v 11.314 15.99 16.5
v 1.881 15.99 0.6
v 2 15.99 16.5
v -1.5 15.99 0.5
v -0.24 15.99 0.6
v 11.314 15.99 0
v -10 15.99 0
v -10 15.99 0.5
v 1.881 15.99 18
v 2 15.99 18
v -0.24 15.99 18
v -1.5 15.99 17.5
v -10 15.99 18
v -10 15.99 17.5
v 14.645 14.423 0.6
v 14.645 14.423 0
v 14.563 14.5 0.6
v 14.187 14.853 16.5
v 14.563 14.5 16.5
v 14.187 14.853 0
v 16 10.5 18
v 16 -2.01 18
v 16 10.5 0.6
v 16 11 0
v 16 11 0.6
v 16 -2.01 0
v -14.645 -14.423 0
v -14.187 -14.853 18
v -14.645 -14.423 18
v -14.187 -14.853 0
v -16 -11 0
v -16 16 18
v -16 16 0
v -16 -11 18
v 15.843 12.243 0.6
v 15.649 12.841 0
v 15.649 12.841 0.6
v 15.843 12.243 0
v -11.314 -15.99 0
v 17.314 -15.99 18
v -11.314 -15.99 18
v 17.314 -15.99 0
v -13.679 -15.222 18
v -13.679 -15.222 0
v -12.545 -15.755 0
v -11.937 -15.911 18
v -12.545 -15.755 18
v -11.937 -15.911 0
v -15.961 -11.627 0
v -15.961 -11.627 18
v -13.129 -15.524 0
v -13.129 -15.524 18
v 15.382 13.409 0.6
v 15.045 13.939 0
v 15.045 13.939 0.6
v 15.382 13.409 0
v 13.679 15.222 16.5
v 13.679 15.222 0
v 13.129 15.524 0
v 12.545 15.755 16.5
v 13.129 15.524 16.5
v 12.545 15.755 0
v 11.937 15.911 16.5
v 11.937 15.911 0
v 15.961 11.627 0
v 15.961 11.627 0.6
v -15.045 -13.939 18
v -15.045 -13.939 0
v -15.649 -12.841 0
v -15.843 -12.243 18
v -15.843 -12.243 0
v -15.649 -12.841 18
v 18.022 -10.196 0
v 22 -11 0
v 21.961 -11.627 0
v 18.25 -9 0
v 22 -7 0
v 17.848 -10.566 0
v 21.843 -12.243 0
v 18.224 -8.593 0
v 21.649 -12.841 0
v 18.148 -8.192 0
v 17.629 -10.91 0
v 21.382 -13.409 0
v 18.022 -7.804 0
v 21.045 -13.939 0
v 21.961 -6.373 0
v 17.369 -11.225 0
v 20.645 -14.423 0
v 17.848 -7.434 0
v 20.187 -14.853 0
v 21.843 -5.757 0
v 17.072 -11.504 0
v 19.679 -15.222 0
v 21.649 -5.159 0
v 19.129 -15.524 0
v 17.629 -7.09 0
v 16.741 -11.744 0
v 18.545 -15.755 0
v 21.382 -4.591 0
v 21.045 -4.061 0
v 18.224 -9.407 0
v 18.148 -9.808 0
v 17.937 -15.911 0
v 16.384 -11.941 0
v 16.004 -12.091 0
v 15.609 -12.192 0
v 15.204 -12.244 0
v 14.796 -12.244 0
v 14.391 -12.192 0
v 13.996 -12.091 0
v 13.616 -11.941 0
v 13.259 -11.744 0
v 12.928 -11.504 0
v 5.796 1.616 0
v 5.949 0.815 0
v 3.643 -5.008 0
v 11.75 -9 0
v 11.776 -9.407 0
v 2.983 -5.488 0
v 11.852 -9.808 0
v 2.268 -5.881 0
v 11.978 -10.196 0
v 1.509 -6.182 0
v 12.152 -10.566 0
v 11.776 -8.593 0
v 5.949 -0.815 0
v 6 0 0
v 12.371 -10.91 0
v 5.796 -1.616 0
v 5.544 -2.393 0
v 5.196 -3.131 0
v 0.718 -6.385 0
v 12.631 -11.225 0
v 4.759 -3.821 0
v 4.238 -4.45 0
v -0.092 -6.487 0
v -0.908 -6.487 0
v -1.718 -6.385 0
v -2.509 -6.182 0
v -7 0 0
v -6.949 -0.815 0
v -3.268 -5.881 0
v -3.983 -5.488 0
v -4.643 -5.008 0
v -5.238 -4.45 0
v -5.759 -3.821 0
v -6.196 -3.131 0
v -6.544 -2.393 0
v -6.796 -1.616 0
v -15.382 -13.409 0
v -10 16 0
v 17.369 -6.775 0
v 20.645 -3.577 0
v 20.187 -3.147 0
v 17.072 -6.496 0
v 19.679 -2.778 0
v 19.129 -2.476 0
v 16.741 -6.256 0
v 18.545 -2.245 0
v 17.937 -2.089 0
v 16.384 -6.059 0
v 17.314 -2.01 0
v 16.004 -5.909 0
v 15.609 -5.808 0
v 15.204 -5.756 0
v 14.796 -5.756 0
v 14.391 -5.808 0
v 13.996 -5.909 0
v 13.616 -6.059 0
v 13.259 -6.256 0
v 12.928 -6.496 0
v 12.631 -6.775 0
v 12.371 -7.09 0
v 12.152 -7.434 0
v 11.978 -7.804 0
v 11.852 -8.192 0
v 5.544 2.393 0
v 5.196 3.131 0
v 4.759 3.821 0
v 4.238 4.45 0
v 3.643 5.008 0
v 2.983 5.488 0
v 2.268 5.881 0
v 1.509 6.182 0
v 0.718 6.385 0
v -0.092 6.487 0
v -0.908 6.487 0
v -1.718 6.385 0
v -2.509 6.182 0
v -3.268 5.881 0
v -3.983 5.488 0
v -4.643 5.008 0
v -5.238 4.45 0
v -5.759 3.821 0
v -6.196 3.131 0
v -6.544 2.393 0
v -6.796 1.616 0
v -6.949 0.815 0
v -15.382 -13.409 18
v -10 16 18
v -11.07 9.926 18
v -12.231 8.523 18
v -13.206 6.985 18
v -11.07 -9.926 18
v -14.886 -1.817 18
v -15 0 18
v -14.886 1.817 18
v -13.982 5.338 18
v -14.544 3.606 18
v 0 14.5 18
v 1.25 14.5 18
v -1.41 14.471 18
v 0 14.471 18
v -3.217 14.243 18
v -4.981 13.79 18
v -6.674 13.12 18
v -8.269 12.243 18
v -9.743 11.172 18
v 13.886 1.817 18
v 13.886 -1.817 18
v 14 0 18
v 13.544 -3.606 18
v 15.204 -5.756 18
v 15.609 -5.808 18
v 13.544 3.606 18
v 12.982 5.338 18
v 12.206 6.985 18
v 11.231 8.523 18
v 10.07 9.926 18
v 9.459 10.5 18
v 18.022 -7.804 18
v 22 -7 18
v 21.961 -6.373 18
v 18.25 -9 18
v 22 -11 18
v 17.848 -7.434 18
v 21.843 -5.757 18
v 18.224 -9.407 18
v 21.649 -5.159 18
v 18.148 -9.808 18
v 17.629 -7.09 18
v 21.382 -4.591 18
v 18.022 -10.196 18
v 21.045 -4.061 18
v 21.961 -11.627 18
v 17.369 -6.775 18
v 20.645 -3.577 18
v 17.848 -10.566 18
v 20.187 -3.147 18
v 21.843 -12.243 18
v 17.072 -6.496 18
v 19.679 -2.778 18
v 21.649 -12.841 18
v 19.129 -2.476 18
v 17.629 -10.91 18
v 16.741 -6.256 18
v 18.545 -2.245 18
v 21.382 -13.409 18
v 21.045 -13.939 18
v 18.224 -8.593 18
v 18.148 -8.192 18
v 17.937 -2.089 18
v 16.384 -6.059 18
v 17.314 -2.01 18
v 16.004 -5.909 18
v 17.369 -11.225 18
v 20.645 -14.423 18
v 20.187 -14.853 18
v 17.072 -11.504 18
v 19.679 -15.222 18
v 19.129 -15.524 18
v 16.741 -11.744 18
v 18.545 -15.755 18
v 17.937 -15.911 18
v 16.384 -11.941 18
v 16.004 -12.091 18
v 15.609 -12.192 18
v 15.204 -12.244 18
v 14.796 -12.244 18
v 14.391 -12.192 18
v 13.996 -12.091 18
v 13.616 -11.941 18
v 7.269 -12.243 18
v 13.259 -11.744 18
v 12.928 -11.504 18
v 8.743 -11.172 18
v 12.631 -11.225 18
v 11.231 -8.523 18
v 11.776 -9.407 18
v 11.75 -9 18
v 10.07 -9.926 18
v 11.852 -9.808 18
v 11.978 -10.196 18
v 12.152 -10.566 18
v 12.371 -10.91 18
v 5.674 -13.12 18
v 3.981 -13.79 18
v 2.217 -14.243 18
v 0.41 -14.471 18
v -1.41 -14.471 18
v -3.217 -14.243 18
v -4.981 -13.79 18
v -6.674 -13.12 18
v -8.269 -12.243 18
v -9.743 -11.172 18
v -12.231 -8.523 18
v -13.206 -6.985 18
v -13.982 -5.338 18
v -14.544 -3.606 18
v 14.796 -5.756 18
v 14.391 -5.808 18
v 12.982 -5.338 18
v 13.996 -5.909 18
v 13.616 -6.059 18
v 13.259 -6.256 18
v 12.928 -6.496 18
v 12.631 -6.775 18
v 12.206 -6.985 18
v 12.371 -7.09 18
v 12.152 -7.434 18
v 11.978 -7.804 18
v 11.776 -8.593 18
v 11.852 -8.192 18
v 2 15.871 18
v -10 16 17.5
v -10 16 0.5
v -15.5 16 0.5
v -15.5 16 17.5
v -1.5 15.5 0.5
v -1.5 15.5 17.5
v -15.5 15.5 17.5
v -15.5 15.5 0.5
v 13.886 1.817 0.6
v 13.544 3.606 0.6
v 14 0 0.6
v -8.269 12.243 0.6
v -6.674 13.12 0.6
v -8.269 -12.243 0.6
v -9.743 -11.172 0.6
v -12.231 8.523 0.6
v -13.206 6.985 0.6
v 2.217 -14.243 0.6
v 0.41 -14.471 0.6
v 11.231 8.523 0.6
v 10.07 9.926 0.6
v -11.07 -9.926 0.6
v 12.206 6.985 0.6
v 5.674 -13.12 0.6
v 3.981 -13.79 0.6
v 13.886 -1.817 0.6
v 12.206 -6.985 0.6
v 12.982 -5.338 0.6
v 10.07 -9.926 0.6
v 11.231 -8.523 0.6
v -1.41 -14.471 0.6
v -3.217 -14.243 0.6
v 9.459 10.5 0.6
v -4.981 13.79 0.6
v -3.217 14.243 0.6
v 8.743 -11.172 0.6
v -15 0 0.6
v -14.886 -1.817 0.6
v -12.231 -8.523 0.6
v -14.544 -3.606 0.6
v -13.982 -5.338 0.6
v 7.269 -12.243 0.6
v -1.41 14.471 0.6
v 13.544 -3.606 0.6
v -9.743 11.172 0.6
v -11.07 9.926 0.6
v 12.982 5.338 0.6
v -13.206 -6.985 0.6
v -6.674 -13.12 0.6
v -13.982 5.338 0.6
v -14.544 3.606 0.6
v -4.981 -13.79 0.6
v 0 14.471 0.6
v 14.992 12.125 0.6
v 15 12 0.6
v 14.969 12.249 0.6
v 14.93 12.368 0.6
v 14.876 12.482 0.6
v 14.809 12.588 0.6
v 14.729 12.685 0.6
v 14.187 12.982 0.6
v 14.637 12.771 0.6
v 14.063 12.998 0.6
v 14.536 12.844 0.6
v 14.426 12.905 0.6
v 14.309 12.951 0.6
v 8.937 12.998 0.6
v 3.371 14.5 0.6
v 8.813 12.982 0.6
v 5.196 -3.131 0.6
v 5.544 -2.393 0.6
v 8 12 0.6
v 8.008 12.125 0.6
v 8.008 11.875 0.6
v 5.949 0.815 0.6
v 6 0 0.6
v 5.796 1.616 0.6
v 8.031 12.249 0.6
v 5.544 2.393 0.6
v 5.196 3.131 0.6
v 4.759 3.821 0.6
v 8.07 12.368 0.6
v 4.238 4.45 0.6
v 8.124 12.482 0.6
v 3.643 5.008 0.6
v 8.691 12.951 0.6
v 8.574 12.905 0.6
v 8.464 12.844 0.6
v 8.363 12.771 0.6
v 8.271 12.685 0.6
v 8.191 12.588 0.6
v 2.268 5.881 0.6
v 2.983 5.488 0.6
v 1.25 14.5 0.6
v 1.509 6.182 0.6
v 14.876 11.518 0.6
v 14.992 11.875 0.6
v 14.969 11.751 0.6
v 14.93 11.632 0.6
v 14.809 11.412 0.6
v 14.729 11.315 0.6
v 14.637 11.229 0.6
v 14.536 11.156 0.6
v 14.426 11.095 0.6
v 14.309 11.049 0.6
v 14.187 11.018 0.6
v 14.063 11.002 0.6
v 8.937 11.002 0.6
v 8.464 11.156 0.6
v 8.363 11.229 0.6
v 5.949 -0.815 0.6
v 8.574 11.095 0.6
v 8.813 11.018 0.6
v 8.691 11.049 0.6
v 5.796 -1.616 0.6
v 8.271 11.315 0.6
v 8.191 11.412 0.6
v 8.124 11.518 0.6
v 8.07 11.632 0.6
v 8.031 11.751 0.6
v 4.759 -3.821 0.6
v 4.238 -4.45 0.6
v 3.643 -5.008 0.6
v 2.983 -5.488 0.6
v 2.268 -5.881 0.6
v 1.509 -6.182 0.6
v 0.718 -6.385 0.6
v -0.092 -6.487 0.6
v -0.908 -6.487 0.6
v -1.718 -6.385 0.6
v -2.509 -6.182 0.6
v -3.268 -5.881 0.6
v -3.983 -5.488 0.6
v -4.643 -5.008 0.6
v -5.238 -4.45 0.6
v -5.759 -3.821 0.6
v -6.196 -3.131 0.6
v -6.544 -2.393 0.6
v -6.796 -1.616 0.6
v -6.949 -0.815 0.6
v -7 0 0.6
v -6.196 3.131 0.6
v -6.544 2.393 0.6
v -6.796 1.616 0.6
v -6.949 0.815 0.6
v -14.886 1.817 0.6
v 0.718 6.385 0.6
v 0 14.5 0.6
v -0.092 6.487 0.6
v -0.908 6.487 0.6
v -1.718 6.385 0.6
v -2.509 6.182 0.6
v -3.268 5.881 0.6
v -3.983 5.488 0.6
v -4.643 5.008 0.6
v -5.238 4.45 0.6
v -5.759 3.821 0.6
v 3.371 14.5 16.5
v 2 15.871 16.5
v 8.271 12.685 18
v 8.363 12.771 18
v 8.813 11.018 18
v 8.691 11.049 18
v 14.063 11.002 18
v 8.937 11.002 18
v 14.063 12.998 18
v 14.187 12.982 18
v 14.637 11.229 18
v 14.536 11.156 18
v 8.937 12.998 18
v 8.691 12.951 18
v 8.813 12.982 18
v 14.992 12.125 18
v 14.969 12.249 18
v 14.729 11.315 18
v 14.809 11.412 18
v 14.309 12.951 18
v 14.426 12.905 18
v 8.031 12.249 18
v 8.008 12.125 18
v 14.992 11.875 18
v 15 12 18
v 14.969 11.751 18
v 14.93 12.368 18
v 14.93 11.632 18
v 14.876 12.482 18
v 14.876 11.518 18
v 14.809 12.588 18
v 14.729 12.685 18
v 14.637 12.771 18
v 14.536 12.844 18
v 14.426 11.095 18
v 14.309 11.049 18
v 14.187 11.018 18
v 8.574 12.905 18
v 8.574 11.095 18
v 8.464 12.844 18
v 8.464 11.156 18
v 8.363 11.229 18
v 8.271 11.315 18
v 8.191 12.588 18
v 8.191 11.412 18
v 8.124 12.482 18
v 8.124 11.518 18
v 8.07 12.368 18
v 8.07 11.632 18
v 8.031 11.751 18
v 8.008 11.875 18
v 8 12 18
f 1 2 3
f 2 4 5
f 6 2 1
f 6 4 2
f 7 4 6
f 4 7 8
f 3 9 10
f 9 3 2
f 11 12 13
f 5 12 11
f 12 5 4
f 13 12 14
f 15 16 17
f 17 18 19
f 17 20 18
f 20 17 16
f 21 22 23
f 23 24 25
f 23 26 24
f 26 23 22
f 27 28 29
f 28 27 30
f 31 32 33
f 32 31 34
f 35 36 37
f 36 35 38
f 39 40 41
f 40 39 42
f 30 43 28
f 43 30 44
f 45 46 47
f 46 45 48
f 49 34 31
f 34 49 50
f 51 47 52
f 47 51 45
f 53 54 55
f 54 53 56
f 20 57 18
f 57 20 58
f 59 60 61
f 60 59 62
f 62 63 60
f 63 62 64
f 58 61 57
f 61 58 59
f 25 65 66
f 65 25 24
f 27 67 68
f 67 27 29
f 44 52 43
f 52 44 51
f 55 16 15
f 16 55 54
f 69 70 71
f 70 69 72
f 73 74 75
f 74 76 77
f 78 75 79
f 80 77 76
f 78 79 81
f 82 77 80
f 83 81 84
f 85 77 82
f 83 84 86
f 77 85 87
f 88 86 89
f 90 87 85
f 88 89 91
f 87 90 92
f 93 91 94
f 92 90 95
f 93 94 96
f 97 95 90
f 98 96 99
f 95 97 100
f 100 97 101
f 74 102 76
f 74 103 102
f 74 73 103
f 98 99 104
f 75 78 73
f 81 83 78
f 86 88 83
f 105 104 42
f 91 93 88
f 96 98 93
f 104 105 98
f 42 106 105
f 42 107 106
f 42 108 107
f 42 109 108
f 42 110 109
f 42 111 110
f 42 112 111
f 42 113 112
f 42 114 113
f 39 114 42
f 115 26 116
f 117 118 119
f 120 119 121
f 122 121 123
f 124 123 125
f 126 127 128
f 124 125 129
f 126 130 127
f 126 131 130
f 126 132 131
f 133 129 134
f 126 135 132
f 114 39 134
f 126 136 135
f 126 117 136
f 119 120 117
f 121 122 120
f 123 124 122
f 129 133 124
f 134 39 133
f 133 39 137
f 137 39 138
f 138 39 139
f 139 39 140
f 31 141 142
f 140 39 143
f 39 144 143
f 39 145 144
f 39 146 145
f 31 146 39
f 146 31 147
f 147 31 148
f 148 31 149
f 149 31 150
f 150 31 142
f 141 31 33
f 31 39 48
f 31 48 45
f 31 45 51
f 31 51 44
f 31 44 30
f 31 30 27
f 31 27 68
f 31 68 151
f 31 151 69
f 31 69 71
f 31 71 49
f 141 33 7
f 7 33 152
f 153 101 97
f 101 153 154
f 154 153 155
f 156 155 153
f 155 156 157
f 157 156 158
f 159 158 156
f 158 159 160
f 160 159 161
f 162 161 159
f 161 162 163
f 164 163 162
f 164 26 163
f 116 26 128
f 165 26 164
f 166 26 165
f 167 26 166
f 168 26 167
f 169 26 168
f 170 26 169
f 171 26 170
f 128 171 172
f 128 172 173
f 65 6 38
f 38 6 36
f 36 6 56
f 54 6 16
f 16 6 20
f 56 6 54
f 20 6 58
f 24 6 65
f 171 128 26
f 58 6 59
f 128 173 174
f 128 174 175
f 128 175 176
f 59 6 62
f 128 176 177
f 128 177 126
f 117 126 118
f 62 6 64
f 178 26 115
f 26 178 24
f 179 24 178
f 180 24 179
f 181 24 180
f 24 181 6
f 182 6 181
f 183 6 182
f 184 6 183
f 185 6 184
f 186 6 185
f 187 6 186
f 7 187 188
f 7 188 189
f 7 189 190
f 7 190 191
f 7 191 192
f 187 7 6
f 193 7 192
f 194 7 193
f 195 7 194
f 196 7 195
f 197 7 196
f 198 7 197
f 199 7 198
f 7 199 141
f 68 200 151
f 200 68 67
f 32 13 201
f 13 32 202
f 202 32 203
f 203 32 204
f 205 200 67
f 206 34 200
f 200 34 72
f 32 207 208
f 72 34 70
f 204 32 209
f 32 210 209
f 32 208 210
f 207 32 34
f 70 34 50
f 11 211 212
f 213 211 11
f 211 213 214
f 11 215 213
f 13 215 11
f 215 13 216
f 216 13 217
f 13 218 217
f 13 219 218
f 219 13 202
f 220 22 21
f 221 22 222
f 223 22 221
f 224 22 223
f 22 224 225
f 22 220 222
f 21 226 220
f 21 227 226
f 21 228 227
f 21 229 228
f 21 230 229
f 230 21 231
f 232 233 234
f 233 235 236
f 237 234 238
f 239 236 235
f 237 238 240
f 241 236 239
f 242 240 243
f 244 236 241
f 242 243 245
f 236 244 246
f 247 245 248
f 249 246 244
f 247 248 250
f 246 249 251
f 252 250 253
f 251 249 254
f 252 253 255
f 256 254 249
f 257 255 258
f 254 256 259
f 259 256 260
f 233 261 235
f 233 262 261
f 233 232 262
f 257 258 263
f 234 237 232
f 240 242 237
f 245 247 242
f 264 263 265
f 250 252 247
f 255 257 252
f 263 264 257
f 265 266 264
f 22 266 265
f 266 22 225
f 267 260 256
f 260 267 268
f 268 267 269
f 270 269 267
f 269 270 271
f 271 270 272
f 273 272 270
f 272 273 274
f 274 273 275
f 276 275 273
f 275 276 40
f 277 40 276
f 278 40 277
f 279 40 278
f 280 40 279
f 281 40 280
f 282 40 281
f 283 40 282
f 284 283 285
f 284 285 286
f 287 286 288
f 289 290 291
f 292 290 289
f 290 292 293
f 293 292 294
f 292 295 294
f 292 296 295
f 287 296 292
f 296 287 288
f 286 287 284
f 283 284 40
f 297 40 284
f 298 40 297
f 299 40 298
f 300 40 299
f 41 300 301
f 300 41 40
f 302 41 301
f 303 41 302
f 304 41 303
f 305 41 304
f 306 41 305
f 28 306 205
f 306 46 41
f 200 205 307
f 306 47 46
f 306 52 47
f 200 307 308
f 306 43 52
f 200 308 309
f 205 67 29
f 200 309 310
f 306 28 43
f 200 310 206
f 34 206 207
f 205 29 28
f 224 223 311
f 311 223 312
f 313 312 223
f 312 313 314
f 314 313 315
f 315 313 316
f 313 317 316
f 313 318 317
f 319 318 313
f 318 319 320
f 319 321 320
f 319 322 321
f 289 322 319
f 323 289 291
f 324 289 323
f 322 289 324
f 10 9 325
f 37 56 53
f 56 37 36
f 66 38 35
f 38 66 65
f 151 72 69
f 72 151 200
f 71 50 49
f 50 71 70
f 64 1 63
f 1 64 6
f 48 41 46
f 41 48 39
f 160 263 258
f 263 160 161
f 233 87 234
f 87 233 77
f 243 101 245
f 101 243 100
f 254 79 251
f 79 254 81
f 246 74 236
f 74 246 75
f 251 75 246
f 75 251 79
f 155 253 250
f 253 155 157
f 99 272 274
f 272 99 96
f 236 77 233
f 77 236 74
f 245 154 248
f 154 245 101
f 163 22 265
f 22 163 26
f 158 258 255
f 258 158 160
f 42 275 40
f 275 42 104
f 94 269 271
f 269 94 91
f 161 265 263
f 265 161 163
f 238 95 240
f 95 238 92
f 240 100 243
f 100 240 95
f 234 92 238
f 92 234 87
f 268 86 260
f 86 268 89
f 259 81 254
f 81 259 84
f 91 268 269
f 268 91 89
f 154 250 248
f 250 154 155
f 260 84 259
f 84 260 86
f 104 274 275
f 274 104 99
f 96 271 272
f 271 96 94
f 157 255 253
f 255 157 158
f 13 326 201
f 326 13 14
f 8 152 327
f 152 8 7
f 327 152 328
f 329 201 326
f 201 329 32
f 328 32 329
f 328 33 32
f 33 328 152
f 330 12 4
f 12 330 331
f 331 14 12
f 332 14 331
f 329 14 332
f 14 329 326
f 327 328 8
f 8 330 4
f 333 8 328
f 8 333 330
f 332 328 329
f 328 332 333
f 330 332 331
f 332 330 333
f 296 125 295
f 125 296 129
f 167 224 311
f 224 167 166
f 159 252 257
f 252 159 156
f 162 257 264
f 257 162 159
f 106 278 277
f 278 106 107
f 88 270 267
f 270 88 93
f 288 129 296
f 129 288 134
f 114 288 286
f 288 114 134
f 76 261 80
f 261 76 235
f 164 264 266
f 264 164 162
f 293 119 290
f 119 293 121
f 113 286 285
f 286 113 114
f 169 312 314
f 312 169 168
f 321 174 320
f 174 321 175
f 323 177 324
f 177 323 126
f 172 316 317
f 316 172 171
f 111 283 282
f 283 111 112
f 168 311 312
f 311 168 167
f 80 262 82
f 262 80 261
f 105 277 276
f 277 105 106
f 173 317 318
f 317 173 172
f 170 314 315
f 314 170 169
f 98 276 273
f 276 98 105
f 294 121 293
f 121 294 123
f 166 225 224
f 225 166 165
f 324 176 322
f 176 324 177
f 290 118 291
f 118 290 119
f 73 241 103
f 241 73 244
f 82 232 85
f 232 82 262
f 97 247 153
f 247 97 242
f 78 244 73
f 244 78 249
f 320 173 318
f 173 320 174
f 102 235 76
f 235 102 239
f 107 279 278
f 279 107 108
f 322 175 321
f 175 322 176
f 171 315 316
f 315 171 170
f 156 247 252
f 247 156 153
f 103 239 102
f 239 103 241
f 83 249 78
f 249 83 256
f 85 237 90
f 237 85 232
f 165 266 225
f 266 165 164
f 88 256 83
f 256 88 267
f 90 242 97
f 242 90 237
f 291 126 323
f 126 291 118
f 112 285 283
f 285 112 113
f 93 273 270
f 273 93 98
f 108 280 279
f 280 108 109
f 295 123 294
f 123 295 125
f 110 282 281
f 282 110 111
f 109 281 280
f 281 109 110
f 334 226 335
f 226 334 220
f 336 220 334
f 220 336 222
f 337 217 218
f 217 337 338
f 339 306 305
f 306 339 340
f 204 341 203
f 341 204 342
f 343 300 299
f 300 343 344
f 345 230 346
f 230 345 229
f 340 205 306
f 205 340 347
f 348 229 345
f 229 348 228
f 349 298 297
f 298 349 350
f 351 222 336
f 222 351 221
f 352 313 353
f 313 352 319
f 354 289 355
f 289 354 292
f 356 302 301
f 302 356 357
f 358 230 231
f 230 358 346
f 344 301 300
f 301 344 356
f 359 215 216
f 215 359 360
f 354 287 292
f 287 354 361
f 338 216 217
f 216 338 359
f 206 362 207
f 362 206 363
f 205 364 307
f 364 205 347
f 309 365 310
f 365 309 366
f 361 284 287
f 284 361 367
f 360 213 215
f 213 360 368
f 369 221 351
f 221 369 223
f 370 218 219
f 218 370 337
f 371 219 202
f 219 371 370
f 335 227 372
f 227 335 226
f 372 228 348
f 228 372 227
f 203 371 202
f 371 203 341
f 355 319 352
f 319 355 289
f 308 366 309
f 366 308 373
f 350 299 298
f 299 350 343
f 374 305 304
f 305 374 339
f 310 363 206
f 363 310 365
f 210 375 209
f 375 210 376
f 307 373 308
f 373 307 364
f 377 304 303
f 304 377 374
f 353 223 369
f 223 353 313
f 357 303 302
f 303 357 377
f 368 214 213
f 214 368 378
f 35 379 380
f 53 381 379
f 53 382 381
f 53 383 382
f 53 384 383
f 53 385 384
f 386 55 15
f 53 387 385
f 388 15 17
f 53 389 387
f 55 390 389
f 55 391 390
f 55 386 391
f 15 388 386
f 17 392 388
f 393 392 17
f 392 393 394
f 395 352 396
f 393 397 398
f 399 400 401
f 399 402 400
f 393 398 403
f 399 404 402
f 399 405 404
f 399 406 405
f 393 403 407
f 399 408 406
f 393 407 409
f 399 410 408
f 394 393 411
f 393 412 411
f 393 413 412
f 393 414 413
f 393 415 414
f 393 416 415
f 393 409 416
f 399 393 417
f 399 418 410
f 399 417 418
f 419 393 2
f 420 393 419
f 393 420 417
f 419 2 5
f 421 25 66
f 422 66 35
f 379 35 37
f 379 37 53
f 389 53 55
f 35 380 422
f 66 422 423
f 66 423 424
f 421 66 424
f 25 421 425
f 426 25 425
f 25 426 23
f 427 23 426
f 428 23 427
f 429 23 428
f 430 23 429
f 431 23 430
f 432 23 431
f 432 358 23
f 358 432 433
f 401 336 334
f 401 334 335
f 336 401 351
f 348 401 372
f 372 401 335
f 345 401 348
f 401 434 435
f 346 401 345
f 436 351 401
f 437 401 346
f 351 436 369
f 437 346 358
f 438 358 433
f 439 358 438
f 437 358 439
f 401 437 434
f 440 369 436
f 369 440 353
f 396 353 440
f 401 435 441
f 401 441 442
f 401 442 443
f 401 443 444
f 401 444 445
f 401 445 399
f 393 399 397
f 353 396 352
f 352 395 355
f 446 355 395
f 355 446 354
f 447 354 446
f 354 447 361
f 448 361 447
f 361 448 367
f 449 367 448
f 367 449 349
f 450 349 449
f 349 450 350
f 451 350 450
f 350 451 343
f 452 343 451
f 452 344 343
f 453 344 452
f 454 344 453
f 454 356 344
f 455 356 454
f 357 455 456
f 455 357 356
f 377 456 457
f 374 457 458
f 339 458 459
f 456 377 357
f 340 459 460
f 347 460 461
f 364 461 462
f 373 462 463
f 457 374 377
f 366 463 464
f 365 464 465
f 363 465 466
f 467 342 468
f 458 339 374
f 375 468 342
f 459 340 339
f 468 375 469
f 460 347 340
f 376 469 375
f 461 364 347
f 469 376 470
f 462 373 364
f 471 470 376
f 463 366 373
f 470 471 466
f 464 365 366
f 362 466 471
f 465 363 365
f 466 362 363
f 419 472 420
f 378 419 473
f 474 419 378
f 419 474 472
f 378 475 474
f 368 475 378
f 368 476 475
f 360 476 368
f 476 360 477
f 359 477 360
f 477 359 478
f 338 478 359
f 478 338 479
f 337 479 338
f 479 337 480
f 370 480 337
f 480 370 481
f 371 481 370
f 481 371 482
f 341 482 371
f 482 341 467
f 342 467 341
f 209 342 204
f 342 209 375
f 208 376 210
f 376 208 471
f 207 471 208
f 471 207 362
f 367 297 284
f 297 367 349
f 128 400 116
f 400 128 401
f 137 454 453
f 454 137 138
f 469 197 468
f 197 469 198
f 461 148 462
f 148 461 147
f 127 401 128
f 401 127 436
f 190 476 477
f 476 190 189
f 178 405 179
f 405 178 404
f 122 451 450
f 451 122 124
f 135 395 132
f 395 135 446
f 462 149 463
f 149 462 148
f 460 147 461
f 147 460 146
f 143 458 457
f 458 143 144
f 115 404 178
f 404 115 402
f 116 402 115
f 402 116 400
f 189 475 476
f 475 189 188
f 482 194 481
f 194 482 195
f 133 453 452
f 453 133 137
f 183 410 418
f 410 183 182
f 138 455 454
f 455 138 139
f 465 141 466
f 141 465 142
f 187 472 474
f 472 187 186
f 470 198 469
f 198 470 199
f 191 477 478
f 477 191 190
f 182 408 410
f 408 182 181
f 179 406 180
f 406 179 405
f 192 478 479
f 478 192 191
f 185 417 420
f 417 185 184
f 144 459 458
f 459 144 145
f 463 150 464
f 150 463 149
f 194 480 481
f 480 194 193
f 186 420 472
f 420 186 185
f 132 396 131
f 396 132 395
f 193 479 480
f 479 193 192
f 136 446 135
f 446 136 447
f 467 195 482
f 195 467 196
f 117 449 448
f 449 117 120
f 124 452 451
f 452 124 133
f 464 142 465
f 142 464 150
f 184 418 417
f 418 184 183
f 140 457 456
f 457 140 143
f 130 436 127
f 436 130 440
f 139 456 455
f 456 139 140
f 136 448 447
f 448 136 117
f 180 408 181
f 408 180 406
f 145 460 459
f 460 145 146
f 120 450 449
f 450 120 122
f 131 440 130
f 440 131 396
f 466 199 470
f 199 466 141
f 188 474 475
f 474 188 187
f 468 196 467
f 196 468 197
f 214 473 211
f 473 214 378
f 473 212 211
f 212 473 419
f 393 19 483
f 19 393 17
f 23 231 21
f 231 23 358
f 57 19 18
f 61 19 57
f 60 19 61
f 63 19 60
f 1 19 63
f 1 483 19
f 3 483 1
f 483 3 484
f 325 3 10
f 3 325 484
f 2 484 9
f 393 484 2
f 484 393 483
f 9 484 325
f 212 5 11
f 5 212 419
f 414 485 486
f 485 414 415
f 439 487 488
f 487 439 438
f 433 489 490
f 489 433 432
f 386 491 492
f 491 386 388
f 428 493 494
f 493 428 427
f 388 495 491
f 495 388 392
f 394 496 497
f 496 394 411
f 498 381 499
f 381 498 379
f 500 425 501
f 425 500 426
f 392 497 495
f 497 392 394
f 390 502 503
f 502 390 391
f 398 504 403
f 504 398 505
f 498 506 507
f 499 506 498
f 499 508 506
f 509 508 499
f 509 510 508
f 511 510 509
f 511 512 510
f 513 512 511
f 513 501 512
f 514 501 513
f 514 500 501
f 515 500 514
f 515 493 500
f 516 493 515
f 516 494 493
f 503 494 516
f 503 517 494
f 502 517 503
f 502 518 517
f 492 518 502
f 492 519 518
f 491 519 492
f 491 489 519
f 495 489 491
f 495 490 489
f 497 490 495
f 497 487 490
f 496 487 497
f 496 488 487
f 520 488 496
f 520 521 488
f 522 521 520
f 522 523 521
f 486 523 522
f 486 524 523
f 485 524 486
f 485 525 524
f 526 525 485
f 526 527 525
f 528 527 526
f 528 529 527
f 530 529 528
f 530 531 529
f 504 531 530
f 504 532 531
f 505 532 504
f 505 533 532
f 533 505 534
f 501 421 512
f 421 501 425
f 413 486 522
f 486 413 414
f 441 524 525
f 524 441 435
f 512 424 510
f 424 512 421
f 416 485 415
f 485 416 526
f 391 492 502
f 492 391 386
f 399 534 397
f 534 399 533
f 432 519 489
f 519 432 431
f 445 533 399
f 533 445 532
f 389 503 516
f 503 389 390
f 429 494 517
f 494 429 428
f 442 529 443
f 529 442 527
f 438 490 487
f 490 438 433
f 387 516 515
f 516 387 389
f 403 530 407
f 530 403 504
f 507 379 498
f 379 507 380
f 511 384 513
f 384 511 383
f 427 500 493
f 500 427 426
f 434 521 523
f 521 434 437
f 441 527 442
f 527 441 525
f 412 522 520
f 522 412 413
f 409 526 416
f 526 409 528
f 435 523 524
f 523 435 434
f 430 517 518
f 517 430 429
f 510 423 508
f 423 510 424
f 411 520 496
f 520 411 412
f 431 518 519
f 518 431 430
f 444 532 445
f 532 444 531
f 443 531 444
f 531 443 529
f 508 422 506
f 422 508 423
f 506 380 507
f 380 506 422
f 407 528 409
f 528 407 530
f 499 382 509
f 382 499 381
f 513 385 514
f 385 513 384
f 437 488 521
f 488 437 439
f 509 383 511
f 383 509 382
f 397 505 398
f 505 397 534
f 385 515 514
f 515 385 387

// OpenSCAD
$fn = 50;


union() {
	difference() {
		union() {
			translate(v = [0, 0, 0]) {
				rotate(a = [0, 0, 0]) {
					hull() {
						translate(v = [-11.0000000000, 11.0000000000, 0]) {
							rotate(a = [0, 0, 0]) {
								translate(v = [0, 0, 0]) {
									rotate(a = [0, 0, 0]) {
										cylinder(h = 18, r = 5);
									}
								}
							}
						}
						translate(v = [11.0000000000, 11.0000000000, 0]) {
							rotate(a = [0, 0, 0]) {
								translate(v = [0, 0, 0]) {
									rotate(a = [0, 0, 0]) {
										cylinder(h = 18, r = 5);
									}
								}
							}
						}
						translate(v = [-11.0000000000, -11.0000000000, 0]) {
							rotate(a = [0, 0, 0]) {
								translate(v = [0, 0, 0]) {
									rotate(a = [0, 0, 0]) {
										cylinder(h = 18, r = 5);
									}
								}
							}
						}
						translate(v = [11.0000000000, -11.0000000000, 0]) {
							rotate(a = [0, 0, 0]) {
								translate(v = [0, 0, 0]) {
									rotate(a = [0, 0, 0]) {
										cylinder(h = 18, r = 5);
									}
								}
							}
						}
					}
				}
			}
			translate(v = [7.5000000000, -9.0000000000, 0]) {
				rotate(a = [0, 0, 0]) {
					hull() {
						translate(v = [-9.5000000000, 2.0000000000, 0]) {
							rotate(a = [0, 0, 0]) {
								translate(v = [0, 0, 0]) {
									rotate(a = [0, 0, 0]) {
										cylinder(h = 18, r = 5);
									}
								}
							}
						}
						translate(v = [9.5000000000, 2.0000000000, 0]) {
							rotate(a = [0, 0, 0]) {
								translate(v = [0, 0, 0]) {
									rotate(a = [0, 0, 0]) {
										cylinder(h = 18, r = 5);
									}
								}
							}
						}
						translate(v = [-9.5000000000, -2.0000000000, 0]) {
							rotate(a = [0, 0, 0]) {
								translate(v = [0, 0, 0]) {
									rotate(a = [0, 0, 0]) {
										cylinder(h = 18, r = 5);
									}
								}
							}
						}
						translate(v = [9.5000000000, -2.0000000000, 0]) {
							rotate(a = [0, 0, 0]) {
								translate(v = [0, 0, 0]) {
									rotate(a = [0, 0, 0]) {
										cylinder(h = 18, r = 5);
									}
								}
							}
						}
					}
				}
			}
			translate(v = [-16.0000000000, 10.0000000000, 0]) {
				rotate(a = [0, 0, 0]) {
					cube(size = [6, 6, 18]);
				}
			}
		}
		union() {
			translate(v = [-15.5000000000, 15.5000000000, 0.5000000000]) {
				rotate(a = [0, 0, 0]) {
					cube(size = [14, 0.5000000000, 17.0000000000]);
				}
			}
			translate(v = [15.0000000000, -9.0000000000, -125.0000000000]) {
				rotate(a = [0, 0, 0]) {
					cylinder(h = 250, r = 3.2500000000);
				}
			}
			translate(v = [-0.5000000000, 0.0000000000, 0.6000000000]) {
				rotate(a = [0, 0, 0]) {
					cylinder(h = 20.4000000000, r = 14.5000000000);
				}
			}
			translate(v = [-0.5000000000, 0.0000000000, -9.0000000000]) {
				rotate(a = [0, 0, 0]) {
					cylinder(h = 18, r = 6.5000000000);
				}
			}
			translate(v = [0.0000000000, 10.5000000000, 0.6000000000]) {
				rotate(a = [0, 0, 0]) {
					cube(size = [16.0000000000, 4, 20.4000000000]);
				}
			}
			translate(v = [2.0000000000, 10.5000000000, 16.5000000000]) {
				rotate(a = [0, 0, 0]) {
					cube(size = [14.0000000000, 7, 1.5000000000]);
				}
			}
			translate(v = [-3.0000000000, 18.7500000000, 0.6000000000]) {
				rotate(a = [0, 0, -45]) {
					cube(size = [10, 1.5000000000, 20.4000000000]);
				}
			}
			translate(v = [2.2500000000, 11.0000000000, 0.6000000000]) {
				rotate(a = [0, 0, 0]) {
					cube(size = [7.5000000000, 2, 17.4000000000]);
				}
			}
		}
	}
	union() {
		translate(v = [11.5000000000, 12, 0]) {
			rotate(a = [0, 0, 0]) {
				hull() {
					translate(v = [2.5000000000, 0, 0]) {
						rotate(a = [0, 0, 0]) {
							translate(v = [0, 0, 0]) {
								rotate(a = [0, 0, 0]) {
									cylinder(h = 18, r = 1.0000000000);
								}
							}
						}
					}
					translate(v = [-2.5000000000, 0, 0]) {
						rotate(a = [0, 0, 0]) {
							translate(v = [0, 0, 0]) {
								rotate(a = [0, 0, 0]) {
									cylinder(h = 18, r = 1.0000000000);
								}
							}
						}
					}
				}
			}
		}
	}
}
